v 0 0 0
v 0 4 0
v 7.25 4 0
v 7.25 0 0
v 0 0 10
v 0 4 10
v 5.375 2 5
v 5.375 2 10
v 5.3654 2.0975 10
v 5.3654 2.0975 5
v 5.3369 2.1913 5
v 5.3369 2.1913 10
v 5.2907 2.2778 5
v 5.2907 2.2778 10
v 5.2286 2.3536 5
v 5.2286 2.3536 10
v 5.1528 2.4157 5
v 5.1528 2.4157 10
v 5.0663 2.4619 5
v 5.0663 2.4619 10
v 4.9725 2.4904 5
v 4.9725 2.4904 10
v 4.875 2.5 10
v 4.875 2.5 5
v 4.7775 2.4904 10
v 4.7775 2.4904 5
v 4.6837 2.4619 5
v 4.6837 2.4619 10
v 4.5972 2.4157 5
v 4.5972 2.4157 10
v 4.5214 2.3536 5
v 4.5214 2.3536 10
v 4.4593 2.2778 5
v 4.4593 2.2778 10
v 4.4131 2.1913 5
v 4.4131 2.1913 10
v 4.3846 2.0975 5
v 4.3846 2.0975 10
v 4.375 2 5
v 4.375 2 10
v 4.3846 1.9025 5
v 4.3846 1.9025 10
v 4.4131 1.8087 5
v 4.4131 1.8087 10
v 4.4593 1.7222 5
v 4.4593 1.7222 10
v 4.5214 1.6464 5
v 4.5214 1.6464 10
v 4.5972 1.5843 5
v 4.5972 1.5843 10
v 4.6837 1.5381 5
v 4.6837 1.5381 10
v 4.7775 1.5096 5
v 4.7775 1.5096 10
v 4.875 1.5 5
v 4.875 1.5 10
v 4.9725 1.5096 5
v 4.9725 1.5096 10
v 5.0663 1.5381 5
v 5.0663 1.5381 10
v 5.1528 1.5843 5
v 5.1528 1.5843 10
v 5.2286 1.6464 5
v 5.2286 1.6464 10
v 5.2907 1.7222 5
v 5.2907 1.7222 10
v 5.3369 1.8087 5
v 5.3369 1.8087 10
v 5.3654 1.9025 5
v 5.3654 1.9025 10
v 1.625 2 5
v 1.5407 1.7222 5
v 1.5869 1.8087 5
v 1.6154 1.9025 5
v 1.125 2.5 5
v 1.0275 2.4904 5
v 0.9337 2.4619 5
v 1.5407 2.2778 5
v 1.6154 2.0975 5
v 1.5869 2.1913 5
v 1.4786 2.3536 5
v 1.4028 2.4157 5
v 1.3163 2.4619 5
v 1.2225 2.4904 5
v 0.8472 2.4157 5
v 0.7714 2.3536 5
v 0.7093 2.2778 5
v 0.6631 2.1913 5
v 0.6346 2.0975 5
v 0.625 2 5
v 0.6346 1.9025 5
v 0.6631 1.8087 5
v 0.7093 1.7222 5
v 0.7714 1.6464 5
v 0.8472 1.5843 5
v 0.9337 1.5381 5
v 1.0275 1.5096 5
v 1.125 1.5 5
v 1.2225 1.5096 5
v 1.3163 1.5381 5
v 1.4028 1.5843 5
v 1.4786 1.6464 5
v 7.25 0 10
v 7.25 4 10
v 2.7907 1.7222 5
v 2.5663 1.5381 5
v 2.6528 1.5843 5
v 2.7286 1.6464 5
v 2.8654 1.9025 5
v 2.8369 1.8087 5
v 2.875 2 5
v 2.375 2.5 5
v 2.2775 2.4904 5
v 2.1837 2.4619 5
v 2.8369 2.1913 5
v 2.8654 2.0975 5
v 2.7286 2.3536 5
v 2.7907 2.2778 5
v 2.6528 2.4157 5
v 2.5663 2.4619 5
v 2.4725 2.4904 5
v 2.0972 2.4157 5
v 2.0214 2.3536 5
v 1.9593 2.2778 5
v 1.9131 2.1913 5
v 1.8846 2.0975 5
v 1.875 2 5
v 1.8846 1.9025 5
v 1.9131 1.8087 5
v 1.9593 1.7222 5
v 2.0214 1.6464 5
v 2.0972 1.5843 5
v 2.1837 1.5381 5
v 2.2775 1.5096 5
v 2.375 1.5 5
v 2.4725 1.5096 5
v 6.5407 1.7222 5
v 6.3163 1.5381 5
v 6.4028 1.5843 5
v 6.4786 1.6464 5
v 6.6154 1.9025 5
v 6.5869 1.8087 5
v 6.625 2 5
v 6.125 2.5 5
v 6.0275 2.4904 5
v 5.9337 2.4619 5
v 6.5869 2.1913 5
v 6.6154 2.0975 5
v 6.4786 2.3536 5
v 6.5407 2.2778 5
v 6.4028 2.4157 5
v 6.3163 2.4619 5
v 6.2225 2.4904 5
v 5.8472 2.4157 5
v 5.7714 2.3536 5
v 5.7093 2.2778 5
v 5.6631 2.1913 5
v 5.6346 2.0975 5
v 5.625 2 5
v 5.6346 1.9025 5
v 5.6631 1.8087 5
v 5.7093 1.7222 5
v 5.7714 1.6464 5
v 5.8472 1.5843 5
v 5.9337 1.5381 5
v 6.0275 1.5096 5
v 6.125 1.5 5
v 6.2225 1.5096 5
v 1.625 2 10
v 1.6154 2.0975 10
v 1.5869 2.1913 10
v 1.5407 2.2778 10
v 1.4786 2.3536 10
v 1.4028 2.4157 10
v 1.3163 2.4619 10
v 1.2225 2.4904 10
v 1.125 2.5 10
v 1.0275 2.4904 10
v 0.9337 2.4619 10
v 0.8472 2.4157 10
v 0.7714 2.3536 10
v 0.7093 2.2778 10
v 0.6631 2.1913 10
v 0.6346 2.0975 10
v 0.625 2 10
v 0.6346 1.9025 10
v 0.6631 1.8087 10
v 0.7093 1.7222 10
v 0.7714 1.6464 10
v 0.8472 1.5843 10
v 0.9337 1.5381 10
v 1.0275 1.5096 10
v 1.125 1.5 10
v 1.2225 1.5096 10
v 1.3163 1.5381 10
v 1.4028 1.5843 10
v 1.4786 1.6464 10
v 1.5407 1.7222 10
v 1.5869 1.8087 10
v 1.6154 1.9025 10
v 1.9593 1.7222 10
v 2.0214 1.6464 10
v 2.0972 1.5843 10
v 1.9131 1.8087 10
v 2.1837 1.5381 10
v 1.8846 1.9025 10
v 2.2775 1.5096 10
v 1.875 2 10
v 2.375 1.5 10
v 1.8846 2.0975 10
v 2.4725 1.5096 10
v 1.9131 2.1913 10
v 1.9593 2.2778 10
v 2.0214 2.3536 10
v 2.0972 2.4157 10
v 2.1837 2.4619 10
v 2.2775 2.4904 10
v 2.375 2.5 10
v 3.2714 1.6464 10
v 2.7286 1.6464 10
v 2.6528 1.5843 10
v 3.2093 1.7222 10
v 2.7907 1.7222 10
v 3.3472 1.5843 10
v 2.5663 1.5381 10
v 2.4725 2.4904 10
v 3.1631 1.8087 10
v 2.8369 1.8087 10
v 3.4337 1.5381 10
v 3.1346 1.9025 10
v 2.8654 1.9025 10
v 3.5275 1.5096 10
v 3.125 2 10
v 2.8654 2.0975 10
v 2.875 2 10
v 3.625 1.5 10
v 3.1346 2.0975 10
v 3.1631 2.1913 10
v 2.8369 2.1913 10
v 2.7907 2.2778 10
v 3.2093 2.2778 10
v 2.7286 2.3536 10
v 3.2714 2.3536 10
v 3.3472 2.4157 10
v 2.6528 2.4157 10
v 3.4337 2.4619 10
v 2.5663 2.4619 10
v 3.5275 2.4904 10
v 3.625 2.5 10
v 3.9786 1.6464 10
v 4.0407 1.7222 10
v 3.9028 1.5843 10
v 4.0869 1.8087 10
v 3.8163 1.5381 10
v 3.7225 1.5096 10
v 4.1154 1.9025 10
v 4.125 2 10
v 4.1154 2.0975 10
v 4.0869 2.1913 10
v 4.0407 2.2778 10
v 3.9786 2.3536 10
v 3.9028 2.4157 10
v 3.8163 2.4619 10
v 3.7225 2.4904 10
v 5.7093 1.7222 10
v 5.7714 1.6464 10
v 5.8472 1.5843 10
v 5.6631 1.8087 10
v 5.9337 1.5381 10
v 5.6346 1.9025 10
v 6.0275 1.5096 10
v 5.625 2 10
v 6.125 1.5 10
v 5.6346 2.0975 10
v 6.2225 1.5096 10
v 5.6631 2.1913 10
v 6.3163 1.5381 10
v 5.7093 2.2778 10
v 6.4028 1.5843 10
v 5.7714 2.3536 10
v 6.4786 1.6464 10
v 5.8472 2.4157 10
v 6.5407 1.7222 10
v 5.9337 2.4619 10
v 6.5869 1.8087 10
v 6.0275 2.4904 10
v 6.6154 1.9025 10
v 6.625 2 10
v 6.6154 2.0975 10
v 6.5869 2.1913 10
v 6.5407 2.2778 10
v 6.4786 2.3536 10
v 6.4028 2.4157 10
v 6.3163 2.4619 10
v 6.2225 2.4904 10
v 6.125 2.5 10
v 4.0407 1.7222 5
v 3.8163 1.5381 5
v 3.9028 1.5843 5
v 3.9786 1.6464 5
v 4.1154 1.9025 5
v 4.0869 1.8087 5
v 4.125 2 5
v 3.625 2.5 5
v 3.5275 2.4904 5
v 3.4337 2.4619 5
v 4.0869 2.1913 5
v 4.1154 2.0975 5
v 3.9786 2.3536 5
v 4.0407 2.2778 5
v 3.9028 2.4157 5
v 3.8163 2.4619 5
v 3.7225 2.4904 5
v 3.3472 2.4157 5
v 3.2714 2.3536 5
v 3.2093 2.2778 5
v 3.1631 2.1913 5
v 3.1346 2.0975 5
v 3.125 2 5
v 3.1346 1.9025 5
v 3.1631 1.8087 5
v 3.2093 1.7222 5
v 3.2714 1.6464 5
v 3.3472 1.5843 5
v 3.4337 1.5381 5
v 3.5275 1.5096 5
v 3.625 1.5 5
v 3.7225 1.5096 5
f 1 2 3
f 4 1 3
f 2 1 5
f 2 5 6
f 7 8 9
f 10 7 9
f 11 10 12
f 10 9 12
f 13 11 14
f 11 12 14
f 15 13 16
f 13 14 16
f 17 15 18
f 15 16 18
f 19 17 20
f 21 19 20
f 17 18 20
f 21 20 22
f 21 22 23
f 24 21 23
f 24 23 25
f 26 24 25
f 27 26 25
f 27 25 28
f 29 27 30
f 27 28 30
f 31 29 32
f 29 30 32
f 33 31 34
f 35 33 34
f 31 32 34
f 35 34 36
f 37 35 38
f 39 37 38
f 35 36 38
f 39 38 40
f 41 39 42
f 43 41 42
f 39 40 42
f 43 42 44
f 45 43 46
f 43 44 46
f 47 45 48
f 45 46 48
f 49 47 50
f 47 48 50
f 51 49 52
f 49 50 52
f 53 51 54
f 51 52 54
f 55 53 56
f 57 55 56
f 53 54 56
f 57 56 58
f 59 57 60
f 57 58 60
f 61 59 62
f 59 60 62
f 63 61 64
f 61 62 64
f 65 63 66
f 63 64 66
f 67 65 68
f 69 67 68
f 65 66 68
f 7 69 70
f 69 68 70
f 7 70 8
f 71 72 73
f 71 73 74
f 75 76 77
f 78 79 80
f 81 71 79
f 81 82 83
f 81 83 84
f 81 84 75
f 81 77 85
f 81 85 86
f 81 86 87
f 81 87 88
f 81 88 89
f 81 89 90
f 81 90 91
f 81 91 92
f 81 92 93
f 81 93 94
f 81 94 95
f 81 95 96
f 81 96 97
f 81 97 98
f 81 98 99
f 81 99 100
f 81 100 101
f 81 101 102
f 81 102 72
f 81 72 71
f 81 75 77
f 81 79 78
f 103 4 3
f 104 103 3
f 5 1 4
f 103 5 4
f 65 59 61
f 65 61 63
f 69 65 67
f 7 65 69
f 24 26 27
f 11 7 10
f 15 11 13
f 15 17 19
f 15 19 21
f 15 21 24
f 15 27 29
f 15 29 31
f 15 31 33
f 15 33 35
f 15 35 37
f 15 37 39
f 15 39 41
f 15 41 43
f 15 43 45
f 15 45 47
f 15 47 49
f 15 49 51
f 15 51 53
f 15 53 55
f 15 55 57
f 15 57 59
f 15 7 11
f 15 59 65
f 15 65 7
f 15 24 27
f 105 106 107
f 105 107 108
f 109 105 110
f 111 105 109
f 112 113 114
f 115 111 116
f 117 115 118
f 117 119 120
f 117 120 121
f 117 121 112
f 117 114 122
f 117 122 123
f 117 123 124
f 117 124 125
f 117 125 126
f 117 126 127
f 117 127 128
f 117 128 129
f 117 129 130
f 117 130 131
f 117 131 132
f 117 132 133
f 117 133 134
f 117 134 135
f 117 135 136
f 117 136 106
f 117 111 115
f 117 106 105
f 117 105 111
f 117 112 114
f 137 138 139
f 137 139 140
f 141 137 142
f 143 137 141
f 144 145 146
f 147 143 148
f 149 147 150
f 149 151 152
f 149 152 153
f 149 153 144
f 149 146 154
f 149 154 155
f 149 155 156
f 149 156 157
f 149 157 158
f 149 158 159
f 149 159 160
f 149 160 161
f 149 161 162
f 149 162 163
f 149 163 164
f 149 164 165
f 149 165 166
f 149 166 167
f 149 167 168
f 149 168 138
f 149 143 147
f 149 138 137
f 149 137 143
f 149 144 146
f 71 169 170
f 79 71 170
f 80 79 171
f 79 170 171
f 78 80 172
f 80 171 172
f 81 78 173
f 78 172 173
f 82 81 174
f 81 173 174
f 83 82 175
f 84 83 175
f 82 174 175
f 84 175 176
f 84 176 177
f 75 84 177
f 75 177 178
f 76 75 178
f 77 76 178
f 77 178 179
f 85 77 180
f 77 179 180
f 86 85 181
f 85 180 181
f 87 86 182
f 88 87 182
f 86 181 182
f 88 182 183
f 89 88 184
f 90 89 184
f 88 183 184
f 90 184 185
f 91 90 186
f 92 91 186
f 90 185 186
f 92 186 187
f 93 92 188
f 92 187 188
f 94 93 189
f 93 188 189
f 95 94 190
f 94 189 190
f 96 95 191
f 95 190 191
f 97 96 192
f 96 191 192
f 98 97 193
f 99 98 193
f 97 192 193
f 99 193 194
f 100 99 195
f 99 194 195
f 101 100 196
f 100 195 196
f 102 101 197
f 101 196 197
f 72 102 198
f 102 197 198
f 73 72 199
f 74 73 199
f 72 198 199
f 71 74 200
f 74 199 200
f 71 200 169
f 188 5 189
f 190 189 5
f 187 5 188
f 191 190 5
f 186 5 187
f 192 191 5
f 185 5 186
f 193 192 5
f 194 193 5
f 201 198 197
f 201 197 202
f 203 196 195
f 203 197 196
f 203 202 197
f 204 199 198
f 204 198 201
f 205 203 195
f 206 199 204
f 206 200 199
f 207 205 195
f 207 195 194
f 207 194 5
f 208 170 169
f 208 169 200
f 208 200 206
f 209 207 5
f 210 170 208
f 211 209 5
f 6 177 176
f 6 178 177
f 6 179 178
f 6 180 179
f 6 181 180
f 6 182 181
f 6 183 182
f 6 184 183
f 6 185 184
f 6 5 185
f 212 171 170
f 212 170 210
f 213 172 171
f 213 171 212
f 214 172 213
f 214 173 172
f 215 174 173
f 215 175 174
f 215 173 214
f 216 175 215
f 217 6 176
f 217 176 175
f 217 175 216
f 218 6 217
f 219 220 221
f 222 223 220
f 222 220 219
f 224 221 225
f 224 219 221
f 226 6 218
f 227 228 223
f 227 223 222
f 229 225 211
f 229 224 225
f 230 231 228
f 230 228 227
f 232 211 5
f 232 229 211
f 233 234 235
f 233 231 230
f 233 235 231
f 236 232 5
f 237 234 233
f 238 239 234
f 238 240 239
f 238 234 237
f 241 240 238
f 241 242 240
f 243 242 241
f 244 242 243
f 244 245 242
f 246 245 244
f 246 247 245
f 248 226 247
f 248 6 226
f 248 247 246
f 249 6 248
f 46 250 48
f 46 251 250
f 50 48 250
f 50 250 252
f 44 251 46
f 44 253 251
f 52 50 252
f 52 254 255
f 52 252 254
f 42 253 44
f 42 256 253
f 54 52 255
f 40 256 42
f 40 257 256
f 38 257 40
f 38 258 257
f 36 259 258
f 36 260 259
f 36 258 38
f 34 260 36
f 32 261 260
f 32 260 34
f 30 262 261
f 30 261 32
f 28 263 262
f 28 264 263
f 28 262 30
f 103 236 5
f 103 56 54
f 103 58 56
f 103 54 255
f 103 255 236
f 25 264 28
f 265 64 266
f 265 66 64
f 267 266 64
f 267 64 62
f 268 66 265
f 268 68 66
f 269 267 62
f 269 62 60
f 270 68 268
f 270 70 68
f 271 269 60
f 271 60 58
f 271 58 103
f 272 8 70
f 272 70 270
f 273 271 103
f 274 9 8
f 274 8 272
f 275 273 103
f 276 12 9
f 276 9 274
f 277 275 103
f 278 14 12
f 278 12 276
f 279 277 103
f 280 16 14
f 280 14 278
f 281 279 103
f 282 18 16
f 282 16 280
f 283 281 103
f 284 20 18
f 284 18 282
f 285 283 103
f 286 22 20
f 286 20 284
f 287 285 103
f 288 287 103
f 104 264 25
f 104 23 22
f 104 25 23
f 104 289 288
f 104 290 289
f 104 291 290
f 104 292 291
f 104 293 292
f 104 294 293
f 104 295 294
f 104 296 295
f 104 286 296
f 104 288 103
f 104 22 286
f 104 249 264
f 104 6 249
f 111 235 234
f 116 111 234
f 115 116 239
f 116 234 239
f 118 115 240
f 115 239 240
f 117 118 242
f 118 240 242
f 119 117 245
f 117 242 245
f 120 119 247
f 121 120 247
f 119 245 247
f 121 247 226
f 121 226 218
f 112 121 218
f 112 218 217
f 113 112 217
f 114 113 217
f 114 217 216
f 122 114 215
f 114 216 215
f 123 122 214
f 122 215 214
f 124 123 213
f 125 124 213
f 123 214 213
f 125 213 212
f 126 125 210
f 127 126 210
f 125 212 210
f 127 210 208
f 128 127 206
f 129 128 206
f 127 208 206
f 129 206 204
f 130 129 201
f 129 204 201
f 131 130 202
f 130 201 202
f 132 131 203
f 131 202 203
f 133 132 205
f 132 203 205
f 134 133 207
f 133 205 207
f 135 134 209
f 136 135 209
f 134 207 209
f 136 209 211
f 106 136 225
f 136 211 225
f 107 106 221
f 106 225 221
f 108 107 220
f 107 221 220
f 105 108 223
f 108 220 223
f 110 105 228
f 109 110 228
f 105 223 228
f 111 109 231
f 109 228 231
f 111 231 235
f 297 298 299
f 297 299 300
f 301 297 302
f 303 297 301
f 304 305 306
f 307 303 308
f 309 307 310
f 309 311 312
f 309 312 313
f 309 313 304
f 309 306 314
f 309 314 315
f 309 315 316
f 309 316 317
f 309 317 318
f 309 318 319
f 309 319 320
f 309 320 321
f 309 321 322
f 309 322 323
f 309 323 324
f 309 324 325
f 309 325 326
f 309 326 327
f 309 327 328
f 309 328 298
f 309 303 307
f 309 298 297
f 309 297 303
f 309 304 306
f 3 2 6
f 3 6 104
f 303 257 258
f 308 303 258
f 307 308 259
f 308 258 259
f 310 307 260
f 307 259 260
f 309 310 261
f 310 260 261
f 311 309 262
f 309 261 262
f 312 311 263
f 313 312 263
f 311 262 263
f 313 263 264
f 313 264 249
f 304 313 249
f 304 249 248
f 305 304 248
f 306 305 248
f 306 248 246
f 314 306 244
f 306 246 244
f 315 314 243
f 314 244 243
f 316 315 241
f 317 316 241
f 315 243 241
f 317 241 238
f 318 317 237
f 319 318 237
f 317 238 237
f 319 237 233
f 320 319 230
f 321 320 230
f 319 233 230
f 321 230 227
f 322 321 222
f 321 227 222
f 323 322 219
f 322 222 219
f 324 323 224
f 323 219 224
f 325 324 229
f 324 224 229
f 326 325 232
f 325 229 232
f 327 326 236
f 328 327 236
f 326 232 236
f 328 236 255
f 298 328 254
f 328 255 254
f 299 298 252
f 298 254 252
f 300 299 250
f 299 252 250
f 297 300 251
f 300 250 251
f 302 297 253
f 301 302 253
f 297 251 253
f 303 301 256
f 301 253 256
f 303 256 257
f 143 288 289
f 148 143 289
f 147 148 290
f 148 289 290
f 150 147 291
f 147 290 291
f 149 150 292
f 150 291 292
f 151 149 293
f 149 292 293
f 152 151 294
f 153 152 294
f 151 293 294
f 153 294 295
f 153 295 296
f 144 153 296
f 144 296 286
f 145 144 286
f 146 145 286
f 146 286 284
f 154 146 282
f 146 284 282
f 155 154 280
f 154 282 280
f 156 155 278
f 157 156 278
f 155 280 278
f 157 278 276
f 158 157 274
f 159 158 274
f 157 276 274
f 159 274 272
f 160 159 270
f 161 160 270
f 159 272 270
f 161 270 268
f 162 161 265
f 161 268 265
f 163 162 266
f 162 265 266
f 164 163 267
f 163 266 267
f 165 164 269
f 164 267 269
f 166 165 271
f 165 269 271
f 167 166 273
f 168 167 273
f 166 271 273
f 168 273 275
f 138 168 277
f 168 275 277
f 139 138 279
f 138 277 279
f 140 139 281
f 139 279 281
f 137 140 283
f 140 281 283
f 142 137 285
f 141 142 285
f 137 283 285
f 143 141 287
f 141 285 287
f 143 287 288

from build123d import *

# Parameters (mm, degrees)
SKETCH2_W           = 7.25
SKETCH2_H           = 4
BOSS_EXTRUDE1_DEPTH = 10
SKETCH3_R           = 0.5
CUT_EXTRUDE1_DEPTH  = 5


with BuildPart() as part:
    # Sketch2 → Boss-Extrude1 (new body)
    with BuildSketch(Plane.XY):
        with Locations((3.625, 2)):
            Rectangle(SKETCH2_W, SKETCH2_H)
    extrude(amount=BOSS_EXTRUDE1_DEPTH)

    # Sketch3 → Cut-Extrude1 (cut)
    with BuildSketch(Plane.XY.offset(10)):
        with Locations((1.125, 2)):
            Circle(SKETCH3_R)
        with Locations((2.375, 2)):
            Circle(SKETCH3_R)
        with Locations((3.625, 2)):
            Circle(SKETCH3_R)
        with Locations((4.875, 2)):
            Circle(SKETCH3_R)
        with Locations((6.125, 2)):
            Circle(SKETCH3_R)
    extrude(amount=-CUT_EXTRUDE1_DEPTH, mode=Mode.SUBTRACT)


solid = part.part
